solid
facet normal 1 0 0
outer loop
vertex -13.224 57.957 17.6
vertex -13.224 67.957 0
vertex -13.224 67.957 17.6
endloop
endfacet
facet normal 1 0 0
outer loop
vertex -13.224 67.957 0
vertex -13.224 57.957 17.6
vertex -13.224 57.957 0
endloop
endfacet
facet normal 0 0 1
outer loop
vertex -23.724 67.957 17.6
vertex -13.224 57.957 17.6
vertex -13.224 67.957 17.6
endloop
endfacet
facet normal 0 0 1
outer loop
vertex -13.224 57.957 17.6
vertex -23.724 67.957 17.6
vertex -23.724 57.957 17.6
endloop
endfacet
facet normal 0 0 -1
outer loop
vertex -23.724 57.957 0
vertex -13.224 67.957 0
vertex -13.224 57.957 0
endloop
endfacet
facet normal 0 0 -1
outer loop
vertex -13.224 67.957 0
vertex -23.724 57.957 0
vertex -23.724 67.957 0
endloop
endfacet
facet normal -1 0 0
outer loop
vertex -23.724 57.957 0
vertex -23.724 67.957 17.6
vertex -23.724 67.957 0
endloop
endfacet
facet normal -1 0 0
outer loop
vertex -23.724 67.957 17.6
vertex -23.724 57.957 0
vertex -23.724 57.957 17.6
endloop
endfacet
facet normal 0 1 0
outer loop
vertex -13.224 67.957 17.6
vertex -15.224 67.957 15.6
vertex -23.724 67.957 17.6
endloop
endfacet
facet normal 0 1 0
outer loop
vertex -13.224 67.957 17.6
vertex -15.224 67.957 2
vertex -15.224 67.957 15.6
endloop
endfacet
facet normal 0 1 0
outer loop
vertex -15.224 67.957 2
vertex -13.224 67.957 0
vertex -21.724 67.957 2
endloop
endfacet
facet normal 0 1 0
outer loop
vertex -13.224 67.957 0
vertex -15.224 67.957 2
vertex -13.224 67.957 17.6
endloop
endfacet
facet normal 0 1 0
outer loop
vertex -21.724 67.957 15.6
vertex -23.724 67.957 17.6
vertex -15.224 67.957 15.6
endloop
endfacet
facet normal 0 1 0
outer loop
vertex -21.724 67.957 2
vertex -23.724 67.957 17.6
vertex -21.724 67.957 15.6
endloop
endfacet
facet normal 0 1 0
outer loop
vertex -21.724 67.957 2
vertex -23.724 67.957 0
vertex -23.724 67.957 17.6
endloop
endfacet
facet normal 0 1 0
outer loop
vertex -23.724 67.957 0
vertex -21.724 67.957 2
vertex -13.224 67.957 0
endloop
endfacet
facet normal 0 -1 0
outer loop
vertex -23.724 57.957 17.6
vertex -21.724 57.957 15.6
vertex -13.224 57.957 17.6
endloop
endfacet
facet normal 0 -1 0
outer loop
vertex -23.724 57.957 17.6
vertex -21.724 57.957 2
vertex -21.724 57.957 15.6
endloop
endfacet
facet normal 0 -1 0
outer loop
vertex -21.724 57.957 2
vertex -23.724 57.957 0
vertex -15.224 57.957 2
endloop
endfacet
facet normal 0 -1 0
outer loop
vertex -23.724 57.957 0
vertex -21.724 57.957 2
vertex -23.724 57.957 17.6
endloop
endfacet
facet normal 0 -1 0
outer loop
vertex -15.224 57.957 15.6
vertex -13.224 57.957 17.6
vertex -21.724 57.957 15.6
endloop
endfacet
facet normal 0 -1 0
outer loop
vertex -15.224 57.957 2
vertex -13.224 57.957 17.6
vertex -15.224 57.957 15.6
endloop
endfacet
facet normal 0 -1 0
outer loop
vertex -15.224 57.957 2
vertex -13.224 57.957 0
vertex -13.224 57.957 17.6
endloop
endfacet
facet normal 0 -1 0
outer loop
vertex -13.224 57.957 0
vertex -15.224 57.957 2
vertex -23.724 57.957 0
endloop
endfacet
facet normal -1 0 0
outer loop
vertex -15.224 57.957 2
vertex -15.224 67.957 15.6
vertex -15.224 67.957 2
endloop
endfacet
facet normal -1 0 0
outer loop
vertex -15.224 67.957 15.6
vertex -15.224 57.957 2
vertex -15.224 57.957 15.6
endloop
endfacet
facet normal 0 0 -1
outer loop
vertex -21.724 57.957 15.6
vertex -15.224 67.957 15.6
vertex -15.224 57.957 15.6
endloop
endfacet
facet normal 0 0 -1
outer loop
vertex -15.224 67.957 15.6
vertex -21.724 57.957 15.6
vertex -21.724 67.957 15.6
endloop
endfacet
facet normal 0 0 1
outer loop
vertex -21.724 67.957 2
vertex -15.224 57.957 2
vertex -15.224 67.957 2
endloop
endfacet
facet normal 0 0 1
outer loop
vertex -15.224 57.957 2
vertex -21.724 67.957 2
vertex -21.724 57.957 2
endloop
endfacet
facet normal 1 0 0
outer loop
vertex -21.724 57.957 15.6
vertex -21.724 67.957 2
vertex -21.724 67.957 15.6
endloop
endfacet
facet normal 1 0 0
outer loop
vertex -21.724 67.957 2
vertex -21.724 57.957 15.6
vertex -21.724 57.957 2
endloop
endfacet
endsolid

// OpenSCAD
difference () {
  translate ([-18.47361635214805, 62.9565168793326, 8.8]) {
    cube ([10.5, 10.0, 17.6], center=true);
  }
  translate ([-18.47361635214805, 62.9565168793326, 8.8]) {
    cube ([6.5, 10.0, 13.6], center=true);
  }
}
